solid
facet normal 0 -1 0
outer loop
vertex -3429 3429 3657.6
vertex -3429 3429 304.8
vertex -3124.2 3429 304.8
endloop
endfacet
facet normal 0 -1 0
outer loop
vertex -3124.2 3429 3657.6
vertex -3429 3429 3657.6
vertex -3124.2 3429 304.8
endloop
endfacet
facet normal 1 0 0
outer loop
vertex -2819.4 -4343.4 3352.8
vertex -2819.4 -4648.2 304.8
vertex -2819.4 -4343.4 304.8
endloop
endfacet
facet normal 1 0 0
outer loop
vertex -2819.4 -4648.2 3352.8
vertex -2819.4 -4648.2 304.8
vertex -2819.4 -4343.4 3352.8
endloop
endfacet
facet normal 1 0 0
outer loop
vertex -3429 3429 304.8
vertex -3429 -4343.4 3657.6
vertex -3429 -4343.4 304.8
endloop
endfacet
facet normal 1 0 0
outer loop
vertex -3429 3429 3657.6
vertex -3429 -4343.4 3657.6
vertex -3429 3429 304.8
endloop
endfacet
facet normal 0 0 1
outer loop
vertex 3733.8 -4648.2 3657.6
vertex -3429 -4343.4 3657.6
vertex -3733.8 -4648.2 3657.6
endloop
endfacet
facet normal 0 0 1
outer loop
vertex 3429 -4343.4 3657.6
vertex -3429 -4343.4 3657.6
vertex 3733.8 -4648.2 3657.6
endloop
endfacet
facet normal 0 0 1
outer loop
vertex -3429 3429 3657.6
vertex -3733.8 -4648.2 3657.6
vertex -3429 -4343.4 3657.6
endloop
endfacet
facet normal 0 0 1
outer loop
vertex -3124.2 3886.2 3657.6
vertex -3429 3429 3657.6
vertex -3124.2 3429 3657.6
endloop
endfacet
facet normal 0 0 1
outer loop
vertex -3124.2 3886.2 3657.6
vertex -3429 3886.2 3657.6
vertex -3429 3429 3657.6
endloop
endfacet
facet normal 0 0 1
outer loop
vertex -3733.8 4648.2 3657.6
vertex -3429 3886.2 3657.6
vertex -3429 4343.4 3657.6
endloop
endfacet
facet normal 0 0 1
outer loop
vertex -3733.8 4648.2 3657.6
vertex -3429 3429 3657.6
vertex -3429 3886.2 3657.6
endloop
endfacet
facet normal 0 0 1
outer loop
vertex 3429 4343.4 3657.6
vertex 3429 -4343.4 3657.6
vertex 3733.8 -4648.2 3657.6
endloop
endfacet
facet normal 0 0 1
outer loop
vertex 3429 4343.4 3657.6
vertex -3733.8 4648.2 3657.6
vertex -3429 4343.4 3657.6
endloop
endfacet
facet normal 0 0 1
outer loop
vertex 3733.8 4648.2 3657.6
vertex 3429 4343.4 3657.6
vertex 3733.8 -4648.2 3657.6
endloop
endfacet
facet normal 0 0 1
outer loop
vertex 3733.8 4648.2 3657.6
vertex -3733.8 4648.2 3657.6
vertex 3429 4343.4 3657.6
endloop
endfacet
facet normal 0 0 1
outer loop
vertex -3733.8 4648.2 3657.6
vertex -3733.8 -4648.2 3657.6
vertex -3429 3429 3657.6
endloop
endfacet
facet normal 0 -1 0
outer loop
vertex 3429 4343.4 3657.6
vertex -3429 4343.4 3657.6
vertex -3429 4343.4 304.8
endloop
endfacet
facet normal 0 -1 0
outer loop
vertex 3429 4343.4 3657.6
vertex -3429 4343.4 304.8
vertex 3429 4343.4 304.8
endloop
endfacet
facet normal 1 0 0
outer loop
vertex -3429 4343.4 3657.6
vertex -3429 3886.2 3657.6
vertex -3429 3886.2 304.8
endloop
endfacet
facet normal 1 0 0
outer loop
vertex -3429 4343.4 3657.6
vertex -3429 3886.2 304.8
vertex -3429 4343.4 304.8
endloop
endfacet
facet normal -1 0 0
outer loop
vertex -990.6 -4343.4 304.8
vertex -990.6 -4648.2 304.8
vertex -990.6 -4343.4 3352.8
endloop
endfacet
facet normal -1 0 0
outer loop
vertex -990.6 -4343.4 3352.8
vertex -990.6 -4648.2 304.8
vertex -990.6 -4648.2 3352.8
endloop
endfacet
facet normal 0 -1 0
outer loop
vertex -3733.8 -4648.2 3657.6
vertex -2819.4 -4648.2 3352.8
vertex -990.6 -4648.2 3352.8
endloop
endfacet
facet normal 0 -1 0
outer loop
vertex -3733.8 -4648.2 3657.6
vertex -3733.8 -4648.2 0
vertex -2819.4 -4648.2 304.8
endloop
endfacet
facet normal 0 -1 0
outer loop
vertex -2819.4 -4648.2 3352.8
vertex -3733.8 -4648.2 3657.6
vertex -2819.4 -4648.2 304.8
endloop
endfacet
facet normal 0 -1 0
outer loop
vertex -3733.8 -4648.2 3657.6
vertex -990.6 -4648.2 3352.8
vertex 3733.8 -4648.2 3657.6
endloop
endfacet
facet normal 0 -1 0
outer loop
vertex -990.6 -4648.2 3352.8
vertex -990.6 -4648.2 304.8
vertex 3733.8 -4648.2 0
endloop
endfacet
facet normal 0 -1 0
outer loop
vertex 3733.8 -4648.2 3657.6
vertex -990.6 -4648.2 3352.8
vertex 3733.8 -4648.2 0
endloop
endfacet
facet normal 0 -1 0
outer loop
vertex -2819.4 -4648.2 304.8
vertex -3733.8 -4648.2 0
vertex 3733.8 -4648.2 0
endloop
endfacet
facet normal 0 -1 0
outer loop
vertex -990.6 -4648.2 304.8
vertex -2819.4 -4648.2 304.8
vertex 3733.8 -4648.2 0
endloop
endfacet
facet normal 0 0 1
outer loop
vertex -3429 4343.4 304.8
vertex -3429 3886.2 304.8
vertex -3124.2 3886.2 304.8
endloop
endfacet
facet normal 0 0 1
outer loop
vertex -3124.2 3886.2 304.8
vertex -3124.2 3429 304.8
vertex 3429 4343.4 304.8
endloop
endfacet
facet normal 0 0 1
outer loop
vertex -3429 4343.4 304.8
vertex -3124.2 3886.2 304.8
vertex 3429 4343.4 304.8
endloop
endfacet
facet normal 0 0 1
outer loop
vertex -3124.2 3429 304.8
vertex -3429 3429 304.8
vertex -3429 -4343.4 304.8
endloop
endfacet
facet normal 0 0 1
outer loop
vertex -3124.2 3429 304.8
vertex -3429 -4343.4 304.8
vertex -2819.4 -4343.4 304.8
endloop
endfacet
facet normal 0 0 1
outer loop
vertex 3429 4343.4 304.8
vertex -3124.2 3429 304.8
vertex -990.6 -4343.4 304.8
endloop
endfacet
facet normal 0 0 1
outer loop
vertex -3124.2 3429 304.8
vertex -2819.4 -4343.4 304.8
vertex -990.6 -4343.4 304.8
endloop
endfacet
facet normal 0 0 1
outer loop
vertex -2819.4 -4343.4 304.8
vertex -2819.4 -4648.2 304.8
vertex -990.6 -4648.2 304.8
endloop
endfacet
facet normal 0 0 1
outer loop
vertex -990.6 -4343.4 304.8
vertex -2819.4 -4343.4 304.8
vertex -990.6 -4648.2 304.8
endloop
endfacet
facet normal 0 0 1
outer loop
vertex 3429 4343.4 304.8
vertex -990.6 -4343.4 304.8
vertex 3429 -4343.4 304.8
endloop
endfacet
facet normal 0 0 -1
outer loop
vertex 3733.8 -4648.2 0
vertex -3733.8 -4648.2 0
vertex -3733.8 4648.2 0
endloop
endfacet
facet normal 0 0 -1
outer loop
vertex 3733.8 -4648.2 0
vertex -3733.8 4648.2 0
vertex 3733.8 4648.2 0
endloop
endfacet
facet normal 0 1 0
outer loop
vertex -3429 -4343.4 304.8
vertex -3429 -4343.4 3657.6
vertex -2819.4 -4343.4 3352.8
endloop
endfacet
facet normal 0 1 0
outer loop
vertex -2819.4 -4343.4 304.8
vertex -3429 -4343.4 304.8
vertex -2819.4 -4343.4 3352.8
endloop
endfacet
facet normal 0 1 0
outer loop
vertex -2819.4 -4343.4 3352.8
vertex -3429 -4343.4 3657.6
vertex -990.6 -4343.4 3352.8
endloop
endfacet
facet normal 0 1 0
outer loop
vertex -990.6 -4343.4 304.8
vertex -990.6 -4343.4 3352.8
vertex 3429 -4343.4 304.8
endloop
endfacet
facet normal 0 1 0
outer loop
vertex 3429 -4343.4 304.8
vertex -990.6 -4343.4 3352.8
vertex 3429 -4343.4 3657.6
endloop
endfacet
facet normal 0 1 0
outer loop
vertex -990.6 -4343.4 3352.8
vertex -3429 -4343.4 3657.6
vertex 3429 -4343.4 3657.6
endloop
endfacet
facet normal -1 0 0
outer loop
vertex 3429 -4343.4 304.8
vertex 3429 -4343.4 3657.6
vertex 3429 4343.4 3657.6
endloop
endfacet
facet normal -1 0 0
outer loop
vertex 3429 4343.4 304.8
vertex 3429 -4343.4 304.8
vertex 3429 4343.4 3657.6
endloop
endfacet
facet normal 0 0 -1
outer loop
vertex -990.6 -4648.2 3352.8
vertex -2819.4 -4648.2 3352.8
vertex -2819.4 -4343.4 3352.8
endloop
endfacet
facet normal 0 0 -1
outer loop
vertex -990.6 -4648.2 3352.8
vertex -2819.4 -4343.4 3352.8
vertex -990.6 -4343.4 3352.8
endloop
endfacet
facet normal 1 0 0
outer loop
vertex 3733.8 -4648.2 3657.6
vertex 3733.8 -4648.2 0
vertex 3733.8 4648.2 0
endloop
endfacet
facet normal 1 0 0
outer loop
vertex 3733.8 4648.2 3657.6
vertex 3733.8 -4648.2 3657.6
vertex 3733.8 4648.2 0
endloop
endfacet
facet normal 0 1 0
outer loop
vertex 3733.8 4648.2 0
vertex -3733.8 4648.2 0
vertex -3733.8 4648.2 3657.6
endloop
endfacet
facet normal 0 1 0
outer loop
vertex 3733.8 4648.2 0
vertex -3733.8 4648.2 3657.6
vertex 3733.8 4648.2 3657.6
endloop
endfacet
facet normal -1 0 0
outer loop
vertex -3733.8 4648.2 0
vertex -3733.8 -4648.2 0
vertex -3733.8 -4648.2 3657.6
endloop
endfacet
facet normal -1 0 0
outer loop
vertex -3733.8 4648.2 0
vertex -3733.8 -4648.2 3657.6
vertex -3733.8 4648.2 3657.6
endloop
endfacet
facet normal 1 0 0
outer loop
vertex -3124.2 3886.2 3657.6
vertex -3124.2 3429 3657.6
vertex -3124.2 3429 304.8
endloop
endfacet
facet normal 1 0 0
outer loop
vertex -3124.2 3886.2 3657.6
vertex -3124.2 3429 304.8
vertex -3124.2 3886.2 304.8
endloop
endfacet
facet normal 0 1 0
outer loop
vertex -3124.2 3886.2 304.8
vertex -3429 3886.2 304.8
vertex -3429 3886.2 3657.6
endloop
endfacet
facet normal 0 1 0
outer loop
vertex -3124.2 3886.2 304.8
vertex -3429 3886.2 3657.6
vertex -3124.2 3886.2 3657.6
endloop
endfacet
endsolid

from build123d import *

# Parameters (mm, degrees)
F0_W     = 7467.6
F0_H     = 9296.4
F1_DEPTH = 3657.6
F2_W     = 6858
F2_H     = 8686.8
F3_DEPTH = 3352.8
F4_W     = 1828.8
F4_H     = 3048
F5_DEPTH = 304.8
F6_W     = 304.8
F6_H     = 457.2
F7_DEPTH = 3352.8


with BuildPart() as f1:
    # F0 (on Top) → F1 (new body)
    with BuildSketch(Plane.XY):
        Rectangle(F0_W, F0_H)
    extrude(amount=F1_DEPTH)

    # F2 (on face) → F3 (cut)
    with BuildSketch(Plane.XY.offset(3657.6)):
        Rectangle(F2_W, F2_H)
    extrude(amount=-F3_DEPTH, mode=Mode.SUBTRACT)

    # F4 (on face) → F5 (cut, through all)
    with BuildSketch(Plane.XZ.offset(4648.2)):
        with Locations((-1905, 1828.8)):
            Rectangle(F4_W, F4_H)
    extrude(amount=-F5_DEPTH, mode=Mode.SUBTRACT)

    # F6 (on face) → F7 (join, through all)
    with BuildSketch(Plane.XY.offset(304.8)):
        with Locations((-3276.6, 3657.6)):
            Rectangle(F6_W, F6_H)
    extrude(amount=F7_DEPTH)


solid = f1.part
